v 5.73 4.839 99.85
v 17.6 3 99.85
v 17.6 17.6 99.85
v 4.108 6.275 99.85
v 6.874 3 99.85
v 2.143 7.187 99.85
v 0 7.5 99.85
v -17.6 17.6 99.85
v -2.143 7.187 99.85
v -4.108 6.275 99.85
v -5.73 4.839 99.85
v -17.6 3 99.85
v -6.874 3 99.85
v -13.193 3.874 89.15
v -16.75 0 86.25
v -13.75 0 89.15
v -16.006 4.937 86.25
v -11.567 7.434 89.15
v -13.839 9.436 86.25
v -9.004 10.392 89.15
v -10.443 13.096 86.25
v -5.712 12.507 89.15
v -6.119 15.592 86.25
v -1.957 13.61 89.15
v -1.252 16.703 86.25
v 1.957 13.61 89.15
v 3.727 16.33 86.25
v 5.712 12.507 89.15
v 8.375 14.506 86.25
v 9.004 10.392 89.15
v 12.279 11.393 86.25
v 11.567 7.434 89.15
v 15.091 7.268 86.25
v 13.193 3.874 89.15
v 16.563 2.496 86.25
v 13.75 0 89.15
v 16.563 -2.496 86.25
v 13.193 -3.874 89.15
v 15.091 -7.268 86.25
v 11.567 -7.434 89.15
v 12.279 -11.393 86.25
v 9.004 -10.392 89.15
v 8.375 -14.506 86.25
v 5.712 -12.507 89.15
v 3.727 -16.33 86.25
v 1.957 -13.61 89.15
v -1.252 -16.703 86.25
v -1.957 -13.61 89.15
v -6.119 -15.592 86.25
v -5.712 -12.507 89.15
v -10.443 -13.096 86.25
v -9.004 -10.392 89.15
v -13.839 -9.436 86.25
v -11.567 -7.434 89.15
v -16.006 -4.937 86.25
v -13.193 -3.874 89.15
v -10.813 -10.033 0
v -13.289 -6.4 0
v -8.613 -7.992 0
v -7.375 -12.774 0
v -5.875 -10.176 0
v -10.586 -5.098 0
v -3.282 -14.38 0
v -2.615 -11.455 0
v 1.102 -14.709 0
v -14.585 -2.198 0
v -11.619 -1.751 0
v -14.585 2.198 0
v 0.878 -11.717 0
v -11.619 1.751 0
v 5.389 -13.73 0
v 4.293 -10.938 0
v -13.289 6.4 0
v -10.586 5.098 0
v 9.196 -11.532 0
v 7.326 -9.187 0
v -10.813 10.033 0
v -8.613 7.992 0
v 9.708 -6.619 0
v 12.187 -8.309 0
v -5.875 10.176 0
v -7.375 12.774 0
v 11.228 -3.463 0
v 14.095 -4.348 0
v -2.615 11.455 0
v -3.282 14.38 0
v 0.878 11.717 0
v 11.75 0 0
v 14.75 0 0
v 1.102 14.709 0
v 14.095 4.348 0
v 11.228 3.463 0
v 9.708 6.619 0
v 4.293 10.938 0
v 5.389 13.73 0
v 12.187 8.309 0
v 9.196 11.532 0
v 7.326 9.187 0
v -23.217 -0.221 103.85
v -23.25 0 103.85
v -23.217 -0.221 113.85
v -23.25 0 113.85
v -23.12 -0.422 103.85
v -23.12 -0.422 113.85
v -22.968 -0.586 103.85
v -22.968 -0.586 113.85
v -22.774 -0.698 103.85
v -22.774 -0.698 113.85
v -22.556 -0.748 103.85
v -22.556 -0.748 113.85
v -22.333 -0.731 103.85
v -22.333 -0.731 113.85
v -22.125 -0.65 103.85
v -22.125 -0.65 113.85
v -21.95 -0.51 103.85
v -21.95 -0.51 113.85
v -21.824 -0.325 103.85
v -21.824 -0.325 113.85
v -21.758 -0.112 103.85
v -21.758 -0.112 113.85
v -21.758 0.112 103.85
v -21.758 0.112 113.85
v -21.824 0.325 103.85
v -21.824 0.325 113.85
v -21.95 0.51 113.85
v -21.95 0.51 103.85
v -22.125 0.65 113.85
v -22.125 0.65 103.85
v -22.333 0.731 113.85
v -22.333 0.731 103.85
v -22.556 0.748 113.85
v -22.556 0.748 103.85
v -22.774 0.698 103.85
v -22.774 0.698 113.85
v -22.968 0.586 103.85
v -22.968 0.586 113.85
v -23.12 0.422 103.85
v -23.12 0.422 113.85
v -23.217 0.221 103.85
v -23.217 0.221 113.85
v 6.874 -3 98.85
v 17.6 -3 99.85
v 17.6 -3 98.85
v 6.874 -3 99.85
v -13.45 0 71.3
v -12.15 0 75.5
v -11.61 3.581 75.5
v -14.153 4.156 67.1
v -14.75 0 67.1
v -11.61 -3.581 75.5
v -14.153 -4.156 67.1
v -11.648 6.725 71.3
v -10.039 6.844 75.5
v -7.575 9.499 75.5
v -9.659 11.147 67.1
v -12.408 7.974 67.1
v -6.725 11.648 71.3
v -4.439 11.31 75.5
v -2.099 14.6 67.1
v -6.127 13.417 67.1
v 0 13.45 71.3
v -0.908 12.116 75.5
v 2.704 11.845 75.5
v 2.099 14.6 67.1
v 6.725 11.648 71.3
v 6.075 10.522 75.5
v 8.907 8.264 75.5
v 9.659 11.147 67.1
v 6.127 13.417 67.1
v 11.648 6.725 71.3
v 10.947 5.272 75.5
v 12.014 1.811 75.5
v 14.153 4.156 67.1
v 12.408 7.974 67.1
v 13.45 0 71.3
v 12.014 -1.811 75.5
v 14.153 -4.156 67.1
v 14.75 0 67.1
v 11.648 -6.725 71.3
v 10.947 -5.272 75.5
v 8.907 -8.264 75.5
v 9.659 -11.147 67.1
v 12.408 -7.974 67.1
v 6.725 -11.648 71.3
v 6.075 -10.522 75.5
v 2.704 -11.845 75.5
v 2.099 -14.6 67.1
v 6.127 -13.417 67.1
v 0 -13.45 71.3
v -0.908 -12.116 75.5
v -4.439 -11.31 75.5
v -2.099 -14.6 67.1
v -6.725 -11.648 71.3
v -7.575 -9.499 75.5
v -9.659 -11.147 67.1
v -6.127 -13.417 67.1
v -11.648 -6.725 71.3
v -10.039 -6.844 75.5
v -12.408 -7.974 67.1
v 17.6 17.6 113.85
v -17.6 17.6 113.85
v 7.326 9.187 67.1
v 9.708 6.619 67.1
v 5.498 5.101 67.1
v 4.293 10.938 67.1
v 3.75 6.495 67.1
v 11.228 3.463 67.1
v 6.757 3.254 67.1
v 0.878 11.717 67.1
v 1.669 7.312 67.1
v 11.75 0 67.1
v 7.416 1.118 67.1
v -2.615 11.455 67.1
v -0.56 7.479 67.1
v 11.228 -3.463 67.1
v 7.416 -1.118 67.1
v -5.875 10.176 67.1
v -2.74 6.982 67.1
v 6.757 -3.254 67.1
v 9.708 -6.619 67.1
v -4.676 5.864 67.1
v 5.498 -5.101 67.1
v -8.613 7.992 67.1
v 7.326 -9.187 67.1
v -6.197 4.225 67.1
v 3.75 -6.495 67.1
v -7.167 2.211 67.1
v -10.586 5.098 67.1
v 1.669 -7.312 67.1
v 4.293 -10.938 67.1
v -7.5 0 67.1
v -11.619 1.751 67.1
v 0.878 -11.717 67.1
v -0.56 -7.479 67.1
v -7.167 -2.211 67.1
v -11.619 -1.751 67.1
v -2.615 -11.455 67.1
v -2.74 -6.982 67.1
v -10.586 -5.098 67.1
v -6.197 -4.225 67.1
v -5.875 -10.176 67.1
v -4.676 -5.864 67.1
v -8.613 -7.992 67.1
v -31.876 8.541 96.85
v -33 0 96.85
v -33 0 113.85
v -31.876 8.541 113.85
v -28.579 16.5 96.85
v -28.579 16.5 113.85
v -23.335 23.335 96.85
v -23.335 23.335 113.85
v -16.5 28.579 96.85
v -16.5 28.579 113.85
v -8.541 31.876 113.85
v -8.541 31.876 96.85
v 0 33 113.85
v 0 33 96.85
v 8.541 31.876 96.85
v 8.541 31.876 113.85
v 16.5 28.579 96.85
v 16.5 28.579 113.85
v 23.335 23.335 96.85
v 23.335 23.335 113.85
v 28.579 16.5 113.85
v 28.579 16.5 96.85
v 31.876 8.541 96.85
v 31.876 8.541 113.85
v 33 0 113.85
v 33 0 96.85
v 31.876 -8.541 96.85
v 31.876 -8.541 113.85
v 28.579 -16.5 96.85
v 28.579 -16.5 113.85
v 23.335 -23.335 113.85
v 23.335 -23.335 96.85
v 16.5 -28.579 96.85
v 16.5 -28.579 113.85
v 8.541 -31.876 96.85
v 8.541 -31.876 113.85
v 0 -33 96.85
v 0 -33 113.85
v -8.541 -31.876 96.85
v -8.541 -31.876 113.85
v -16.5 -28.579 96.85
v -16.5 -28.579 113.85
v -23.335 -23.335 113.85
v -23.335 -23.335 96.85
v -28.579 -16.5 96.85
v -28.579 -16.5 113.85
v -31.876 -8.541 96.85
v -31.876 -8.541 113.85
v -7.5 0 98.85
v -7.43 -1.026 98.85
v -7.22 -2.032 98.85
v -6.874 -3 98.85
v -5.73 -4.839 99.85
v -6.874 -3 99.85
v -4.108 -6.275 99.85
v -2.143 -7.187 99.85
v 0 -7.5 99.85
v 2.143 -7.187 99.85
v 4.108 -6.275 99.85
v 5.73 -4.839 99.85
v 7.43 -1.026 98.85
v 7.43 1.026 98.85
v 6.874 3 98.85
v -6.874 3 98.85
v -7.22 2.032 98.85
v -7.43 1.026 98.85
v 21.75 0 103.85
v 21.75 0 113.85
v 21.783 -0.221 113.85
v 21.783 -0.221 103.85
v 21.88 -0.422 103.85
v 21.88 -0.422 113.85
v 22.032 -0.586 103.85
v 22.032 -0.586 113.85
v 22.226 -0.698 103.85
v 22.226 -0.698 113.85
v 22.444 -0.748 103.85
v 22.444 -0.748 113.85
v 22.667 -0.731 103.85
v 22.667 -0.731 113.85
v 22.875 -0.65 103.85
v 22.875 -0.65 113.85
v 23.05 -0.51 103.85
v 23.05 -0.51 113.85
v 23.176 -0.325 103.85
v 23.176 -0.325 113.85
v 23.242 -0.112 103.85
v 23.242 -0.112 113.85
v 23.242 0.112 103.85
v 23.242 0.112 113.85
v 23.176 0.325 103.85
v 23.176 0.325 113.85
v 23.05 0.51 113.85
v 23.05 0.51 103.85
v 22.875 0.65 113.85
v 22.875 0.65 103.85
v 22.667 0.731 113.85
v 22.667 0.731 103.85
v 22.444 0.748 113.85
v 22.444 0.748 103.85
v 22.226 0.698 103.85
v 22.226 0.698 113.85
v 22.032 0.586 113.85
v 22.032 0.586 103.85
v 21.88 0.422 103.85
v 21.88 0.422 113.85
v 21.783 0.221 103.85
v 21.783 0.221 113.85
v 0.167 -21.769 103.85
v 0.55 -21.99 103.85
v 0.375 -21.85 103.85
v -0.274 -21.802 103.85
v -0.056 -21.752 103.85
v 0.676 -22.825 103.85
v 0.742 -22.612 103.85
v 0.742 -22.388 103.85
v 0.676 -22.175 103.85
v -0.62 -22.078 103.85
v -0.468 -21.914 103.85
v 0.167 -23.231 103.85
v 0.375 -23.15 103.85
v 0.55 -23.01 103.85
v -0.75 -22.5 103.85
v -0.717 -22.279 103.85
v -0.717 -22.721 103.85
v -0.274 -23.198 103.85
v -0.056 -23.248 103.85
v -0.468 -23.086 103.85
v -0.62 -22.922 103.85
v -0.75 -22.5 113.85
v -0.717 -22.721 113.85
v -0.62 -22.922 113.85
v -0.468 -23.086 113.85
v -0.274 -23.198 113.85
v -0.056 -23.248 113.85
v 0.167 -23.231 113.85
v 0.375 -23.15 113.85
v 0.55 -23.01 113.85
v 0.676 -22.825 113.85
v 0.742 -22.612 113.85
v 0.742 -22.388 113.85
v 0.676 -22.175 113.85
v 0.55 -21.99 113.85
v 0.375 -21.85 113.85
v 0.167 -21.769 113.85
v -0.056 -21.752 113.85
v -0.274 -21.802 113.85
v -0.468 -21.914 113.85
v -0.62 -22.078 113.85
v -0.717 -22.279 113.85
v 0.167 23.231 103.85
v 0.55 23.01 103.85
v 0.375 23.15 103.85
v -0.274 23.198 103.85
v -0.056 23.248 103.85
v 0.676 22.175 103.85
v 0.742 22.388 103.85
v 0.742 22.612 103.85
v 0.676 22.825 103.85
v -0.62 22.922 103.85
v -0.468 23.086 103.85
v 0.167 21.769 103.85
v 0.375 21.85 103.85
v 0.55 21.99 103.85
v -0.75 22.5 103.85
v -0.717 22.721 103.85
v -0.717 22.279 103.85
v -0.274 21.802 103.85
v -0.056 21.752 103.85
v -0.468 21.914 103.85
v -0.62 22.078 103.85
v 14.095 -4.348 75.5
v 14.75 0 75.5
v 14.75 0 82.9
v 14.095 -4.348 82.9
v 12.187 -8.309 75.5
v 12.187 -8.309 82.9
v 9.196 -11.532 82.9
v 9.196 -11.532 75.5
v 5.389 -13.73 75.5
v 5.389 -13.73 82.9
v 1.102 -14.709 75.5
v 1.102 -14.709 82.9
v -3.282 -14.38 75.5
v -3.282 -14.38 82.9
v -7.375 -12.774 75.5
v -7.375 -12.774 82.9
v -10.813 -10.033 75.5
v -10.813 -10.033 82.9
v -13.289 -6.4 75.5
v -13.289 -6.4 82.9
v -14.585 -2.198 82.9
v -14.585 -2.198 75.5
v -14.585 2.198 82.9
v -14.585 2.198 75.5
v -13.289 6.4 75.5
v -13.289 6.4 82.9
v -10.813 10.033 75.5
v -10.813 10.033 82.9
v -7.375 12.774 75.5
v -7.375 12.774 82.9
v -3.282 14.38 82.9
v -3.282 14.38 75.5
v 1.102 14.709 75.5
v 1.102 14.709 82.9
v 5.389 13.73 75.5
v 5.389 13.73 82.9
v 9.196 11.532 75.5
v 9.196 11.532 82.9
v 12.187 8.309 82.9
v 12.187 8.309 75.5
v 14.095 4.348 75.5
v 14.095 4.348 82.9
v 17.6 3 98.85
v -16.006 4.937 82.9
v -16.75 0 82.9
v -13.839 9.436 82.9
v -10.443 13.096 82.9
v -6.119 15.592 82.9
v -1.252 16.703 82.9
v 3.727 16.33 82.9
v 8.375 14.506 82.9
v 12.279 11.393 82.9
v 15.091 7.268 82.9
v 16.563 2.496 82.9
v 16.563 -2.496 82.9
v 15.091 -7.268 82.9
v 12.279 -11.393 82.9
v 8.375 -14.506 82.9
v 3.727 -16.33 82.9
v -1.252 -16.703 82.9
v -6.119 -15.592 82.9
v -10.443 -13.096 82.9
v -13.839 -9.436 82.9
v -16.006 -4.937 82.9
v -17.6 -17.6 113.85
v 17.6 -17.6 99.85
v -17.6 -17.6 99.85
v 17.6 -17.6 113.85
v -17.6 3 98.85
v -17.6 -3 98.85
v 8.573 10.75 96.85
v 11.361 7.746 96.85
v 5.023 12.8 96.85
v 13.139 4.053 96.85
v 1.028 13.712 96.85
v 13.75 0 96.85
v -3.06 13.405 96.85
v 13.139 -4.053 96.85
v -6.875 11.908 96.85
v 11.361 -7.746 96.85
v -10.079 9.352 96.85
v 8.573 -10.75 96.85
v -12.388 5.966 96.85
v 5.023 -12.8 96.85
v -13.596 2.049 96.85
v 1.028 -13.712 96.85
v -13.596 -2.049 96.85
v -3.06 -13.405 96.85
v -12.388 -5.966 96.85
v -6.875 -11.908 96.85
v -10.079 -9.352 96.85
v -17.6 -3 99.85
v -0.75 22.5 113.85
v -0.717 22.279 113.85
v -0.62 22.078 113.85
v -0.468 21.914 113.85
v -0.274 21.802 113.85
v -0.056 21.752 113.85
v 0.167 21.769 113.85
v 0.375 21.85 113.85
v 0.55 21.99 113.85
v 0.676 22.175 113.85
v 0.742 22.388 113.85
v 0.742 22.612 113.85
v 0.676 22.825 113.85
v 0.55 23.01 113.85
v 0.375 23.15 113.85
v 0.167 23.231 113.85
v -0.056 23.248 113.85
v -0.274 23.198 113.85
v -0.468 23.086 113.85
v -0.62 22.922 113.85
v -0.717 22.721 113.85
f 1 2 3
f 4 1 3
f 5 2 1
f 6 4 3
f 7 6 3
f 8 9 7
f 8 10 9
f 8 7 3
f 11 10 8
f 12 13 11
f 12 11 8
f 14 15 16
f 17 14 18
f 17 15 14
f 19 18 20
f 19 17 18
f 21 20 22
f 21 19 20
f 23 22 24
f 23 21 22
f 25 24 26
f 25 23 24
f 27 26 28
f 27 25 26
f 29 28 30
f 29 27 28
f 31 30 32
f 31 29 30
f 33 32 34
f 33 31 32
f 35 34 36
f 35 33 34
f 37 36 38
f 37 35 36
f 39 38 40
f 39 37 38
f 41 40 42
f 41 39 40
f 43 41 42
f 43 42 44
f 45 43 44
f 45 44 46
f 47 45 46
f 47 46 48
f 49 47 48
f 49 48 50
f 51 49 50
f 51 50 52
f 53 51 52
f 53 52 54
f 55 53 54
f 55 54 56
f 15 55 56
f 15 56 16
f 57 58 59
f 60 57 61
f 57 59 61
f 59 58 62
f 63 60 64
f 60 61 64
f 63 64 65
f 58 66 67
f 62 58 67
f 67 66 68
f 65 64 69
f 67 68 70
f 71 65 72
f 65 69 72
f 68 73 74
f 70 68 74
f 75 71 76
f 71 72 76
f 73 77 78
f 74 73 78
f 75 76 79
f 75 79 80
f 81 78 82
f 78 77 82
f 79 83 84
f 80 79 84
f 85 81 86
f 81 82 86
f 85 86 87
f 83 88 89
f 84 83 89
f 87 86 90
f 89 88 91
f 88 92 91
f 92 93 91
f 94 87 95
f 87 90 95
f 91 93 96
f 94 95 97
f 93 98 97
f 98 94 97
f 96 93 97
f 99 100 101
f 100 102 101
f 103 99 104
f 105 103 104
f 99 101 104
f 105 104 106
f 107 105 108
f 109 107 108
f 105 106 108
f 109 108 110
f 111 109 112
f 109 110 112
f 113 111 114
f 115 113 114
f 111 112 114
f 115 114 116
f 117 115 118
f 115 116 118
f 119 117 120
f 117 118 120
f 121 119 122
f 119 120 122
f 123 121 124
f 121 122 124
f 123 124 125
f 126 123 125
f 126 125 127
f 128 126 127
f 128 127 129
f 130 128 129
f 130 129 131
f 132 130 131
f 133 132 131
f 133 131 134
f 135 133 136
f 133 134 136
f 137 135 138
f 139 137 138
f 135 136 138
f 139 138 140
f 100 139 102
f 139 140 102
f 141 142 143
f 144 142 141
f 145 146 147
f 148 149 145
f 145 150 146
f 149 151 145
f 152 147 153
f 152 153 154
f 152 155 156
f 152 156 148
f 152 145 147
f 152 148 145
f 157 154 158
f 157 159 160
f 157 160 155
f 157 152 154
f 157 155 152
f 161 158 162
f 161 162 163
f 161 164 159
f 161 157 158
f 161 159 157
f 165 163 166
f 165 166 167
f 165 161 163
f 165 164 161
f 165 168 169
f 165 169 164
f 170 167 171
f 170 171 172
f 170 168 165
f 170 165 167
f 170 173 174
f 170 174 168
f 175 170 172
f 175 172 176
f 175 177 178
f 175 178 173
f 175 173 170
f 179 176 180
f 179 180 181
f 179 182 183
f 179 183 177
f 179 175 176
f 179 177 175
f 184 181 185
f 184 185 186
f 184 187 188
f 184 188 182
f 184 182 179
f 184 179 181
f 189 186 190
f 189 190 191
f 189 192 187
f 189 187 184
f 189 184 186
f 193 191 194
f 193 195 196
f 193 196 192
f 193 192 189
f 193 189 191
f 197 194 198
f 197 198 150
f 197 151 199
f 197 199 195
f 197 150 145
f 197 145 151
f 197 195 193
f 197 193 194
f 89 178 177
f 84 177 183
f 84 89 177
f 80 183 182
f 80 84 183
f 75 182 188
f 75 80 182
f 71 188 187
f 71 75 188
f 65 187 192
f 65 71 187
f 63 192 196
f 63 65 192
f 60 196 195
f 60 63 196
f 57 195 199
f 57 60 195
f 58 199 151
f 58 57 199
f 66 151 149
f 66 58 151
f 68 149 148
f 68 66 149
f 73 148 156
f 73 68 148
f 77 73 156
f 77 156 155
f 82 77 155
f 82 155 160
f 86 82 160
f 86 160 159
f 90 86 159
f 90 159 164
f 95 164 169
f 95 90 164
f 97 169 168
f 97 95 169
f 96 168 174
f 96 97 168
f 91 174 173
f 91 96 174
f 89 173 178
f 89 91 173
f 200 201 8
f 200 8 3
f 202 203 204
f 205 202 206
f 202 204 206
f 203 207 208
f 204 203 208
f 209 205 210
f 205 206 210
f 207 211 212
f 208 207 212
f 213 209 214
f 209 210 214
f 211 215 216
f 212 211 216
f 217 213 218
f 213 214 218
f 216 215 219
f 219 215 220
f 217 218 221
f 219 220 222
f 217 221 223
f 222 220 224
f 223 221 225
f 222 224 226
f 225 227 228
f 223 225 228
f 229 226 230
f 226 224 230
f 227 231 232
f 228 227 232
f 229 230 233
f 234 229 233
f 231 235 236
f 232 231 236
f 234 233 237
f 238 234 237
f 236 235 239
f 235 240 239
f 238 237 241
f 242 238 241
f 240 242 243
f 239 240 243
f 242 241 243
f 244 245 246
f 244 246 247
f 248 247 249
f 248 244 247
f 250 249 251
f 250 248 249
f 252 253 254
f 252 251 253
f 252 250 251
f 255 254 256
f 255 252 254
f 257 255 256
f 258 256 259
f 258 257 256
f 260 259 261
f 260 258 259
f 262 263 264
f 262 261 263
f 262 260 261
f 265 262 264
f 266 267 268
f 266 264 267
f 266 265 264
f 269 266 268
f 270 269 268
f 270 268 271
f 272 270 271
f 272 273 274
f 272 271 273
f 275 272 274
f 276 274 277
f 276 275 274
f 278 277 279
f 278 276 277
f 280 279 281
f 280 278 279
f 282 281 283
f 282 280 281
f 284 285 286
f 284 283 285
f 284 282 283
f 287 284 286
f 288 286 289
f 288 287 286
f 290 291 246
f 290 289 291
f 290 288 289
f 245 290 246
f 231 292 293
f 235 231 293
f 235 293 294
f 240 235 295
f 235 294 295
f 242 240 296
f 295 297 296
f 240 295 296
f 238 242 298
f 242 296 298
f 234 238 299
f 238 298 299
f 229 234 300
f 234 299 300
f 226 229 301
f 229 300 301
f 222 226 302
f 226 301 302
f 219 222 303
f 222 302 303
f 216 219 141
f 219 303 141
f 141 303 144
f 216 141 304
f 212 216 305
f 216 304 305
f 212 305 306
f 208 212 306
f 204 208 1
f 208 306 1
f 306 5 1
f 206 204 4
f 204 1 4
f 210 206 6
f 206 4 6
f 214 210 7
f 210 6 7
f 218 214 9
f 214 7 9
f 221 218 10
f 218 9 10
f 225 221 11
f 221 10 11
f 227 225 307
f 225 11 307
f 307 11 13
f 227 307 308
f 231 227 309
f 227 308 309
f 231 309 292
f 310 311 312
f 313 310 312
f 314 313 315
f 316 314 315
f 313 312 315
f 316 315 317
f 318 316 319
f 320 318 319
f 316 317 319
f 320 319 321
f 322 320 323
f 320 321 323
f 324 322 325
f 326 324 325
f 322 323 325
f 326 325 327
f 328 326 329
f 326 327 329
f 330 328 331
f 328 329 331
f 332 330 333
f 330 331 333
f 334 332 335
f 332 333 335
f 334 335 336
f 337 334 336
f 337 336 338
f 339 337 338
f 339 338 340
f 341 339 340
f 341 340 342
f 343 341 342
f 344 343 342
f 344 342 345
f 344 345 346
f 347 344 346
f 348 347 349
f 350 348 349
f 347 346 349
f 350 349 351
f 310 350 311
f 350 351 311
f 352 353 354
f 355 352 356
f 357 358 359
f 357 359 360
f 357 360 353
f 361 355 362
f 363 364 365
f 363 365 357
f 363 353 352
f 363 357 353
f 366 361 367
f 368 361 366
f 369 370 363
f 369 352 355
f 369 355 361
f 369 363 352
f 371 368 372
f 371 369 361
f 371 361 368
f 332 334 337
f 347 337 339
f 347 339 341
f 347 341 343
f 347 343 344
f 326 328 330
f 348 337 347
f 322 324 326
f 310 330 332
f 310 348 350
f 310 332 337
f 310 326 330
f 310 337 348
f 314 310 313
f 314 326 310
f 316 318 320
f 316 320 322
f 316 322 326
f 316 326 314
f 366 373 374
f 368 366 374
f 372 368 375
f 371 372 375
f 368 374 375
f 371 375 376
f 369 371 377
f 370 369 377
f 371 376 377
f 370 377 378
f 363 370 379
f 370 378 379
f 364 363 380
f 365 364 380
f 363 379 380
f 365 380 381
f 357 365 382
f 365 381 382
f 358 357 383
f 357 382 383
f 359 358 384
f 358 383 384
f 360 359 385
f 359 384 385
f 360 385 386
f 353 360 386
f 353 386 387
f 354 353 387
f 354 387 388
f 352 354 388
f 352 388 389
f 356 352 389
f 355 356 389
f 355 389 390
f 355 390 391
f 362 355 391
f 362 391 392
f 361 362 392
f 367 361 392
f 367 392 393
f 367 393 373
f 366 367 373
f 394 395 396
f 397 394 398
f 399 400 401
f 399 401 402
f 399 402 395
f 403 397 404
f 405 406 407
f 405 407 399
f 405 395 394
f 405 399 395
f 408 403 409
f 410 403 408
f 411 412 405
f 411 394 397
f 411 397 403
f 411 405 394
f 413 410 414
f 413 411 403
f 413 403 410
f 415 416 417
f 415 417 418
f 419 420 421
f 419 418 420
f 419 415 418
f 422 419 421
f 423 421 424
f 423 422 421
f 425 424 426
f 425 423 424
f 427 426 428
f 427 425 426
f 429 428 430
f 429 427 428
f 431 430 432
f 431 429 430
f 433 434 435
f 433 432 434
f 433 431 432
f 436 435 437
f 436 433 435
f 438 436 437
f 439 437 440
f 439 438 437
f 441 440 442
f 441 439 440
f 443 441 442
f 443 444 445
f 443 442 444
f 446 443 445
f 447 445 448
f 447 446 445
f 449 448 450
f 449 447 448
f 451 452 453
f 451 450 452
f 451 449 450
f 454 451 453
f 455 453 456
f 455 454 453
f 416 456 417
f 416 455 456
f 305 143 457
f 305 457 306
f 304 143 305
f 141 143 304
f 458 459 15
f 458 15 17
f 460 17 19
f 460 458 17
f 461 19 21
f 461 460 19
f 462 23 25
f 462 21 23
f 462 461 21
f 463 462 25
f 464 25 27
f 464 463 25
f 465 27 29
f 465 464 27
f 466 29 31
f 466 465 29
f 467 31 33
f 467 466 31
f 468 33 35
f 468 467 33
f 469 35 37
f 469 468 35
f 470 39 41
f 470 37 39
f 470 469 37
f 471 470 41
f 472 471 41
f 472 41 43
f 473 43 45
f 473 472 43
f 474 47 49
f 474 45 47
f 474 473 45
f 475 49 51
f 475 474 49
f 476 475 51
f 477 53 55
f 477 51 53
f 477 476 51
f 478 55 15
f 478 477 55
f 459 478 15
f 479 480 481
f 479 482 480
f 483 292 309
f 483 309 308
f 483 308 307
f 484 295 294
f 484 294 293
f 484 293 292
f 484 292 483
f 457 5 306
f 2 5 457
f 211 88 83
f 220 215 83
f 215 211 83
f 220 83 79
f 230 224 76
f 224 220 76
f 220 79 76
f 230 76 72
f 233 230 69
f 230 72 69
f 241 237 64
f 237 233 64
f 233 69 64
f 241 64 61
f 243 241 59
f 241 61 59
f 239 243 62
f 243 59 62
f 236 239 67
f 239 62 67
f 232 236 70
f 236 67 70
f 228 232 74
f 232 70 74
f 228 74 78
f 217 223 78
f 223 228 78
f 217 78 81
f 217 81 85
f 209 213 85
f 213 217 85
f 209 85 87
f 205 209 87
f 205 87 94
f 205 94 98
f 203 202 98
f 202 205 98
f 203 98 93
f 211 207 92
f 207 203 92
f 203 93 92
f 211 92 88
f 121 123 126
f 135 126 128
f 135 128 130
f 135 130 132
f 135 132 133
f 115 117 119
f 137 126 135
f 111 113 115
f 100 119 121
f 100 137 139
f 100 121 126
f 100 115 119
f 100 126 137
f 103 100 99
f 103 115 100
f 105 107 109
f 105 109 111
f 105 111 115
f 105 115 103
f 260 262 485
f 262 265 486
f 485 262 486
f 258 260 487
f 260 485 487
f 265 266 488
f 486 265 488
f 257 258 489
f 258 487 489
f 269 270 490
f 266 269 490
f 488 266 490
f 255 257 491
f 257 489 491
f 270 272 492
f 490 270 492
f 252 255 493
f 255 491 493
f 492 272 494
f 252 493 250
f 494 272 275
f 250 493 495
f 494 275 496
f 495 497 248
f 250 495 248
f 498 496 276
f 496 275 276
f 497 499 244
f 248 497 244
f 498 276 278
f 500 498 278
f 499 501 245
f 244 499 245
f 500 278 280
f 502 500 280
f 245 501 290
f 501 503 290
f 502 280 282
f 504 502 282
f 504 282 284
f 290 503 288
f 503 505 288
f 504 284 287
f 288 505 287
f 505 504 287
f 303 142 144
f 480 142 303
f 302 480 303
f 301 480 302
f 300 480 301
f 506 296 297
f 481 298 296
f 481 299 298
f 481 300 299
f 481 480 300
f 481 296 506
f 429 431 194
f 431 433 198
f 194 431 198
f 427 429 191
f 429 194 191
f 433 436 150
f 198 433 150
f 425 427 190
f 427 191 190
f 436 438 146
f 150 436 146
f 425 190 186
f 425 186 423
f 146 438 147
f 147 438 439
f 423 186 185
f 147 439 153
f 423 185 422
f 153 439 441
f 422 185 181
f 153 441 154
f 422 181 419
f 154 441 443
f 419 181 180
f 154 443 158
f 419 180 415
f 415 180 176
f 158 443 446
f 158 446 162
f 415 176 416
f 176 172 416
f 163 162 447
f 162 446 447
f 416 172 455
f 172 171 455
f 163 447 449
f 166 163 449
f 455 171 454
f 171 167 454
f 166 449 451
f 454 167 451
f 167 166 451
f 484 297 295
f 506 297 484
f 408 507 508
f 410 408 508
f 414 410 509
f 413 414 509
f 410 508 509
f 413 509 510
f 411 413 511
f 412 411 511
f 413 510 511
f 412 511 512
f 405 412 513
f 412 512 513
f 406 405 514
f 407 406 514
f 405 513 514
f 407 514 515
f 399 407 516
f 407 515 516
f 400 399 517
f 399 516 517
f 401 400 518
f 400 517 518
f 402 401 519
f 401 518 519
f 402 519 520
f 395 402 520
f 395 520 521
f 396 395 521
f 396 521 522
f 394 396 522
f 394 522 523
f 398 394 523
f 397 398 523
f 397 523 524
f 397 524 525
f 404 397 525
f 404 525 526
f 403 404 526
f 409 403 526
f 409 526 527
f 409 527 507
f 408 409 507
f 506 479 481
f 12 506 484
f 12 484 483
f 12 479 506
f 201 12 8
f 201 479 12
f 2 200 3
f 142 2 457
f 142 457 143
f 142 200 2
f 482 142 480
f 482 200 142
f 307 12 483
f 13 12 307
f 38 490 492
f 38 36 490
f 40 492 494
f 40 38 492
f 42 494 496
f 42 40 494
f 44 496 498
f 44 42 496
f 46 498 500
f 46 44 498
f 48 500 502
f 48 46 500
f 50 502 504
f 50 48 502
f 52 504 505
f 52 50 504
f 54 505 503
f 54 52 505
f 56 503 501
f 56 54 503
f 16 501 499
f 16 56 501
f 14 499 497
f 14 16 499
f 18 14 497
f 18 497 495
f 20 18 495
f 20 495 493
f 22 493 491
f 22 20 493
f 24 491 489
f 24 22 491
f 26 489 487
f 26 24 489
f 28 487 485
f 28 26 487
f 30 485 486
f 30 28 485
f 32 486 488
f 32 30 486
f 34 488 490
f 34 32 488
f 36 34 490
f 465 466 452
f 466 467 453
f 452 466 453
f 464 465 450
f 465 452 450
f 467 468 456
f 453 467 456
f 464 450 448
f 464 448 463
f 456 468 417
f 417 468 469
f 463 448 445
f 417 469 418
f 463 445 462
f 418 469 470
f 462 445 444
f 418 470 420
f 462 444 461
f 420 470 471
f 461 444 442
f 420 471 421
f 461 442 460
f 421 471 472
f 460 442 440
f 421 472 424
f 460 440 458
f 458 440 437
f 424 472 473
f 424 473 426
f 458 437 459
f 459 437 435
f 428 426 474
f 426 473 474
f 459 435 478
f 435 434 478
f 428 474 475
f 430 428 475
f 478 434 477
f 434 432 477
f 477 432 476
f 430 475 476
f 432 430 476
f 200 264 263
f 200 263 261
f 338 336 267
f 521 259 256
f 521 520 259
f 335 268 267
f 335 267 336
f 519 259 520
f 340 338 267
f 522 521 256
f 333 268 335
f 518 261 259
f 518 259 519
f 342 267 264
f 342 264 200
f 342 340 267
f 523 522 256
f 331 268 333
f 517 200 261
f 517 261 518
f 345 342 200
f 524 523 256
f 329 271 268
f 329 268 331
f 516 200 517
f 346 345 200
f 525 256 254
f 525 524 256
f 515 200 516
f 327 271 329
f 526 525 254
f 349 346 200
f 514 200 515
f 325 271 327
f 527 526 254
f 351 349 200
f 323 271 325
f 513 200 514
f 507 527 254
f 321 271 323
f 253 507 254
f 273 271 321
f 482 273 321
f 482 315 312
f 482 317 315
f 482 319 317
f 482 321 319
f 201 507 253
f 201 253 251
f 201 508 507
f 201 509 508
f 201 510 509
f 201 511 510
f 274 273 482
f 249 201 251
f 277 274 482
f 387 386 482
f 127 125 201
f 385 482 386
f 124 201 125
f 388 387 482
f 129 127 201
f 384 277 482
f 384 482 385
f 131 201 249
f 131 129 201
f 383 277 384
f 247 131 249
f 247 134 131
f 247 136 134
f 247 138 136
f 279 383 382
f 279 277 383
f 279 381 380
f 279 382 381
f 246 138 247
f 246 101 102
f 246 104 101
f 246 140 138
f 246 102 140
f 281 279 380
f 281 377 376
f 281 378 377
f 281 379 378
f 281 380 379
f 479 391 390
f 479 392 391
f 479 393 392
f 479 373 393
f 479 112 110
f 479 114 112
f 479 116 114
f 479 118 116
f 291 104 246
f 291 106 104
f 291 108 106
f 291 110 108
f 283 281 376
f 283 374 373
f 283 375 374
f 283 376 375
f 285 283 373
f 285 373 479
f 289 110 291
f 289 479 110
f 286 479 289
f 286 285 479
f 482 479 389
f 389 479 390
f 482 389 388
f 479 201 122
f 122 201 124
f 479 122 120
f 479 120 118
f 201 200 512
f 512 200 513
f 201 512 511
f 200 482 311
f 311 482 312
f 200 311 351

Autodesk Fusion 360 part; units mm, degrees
sketch "Sketch1" plane through (0, 0, 0) normal (0, 0, 1) x (1, 0, 0) in component "Arm Cam"
  circle A0 centre (0, 0) radius 14.75
  circle A1 centre (0, 0) radius 11.75
  dimension "d322" = 29.5
  dimension "d323" = -3
  dimension "d395" = 23.5
extrude "Extrude1" add sketch "Sketch1" along normal blind 67.1 makes body 1 in component "Arm Cam"
sketch "Sketch5" plane through (0, 0, 67.1) normal (0, 0, 1) x (-1, 0, 0) in component "Arm Cam"
  circle A0 centre (0, 0) radius 11.75
  circle A1 centre (0, 0) radius 14.75
  circle A2 centre (0, 0) radius 14.75
ref_plane "WorkPlane2" through (0, 0, 75.5) normal (0, 0, 1) x (1, 0, 0) in component "Arm Cam"
sketch "Sketch4" plane through (-143.4796, -223.0695, 75.5) normal (0, 0, 1) x (1, 0, 0) in component "Arm Cam"
  circle A0 centre (143.4796, 223.0695) radius 14.75
  circle A1 centre (143.4796, 223.0695) radius 12.15
  point P0 (143.4796, 223.0695)
  dimension "d330" = 29.5
  dimension "d334" = 24.3
loft "Loft2" add profiles "Sketch5", "Sketch4" section 1 section 2 contours A1 bodies 1 in component "Arm Cam"
extrude "Extrude4" add sketch "Sketch4" along normal blind 7.4 contours A0 | A1 bodies 1 in component "Arm Cam"
sketch "Sketch7" plane through (0, 0, 82.9) normal (0, 0, 1) x (-1, 0, 0) in component "Arm Cam"
  circle A0 centre (0, 0) radius 14.75
  circle A1 centre (0, 0) radius 16.75
  dimension "d339" = 33.5
extrude "Extrude5" add sketch "Sketch7" along normal blind 3.35 contours A0 | A1 bodies 1 in component "Arm Cam"
ref_plane "WorkPlane3" through (0, 0, 89.15) normal (0, 0, 1) x (-1, 0, 0) in component "Arm Cam"
sketch "Sketch8" plane through (-143.4796, -223.0695, 89.15) normal (0, 0, 1) x (1, 0, 0) in component "Arm Cam"
  circle A0 centre (143.4796, 223.0695) radius 13.75
  point P0 (143.4796, 223.0695)
  dimension "d341" = 27.5
extrude "Extrude6" add sketch "Sketch8" along normal blind 7.7 separate body makes body 2 in component "Arm Cam"
loft "Loft3" add section 1 face at (-0.9963, -4.3652, 86.25) section 2 face at (-1.0199, 5.8346, 89.15) on bodies 1 2 bodies 1 2 in component "Arm Cam"
sketch "Sketch9" plane through (0, 0, 96.85) normal (0, 0, 1) x (-1, 0, 0) in component "Arm Cam"
  circle A0 centre (0, 0) radius 13.75
  circle A1 centre (0, 0) radius 33
  dimension "d344" = 66
  dimension "d351" = 27.5
extrude "Extrude7" add sketch "Sketch9" along normal blind 17 contours A0 | A1 bodies 1 in component "Arm Cam"
sketch "Sketch10" plane through (0, 0, 113.85) normal (0, 0, 1) x (-1, 0, 0) in component "Arm Cam"
  circle A0 centre (0, 0) radius 33
  line L0 (-17.6, 17.6) -> (17.6, 17.6)
  line L1 (17.6, 17.6) -> (17.6, -17.6)
  line L2 (17.6, -17.6) -> (-17.6, -17.6)
  line L3 (-17.6, -17.6) -> (-17.6, 17.6)
  line L4 (-17.6, 17.6) -> (17.6, -17.6) construction
  line L5 (17.6, 17.6) -> (-17.6, -17.6) construction
  circle A1 centre (0, 0) radius 7.5
  line L6 (-17.6, 3) -> (17.6, 3)
  line L7 (17.6, 3) -> (17.6, -3)
  line L8 (17.6, -3) -> (-17.6, -3)
  line L9 (-17.6, -3) -> (-17.6, 3)
  line L10 (-17.6, 3) -> (17.6, -3) construction
  line L11 (17.6, 3) -> (-17.6, -3) construction
  line L12 (-22.5, 22.5) -> (22.5, 22.5) construction
  line L13 (22.5, 22.5) -> (22.5, -22.5) construction
  line L14 (22.5, -22.5) -> (-22.5, -22.5) construction
  line L15 (-22.5, -22.5) -> (-22.5, 22.5) construction
  line L16 (-22.5, 22.5) -> (22.5, -22.5) construction
  line L17 (22.5, 22.5) -> (-22.5, -22.5) construction
  circle A2 centre (22.5, 0) radius 0.75
  circle A3 centre (0, -22.5) radius 0.75
  circle A4 centre (-22.5, 0) radius 0.75
  circle A5 centre (0, 22.5) radius 0.75
  dimension "d347" = 35.2
  dimension "d348" = 35.2
  dimension "d352" = 15
  dimension "d354" = 6
  dimension "d357" = 45
  dimension "d358" = 45
  dimension "d359" = 1.5
  dimension "d360" = 1.5
  dimension "d361" = 1.5
  dimension "d362" = 1.5
extrude "Extrude8" cut sketch "Sketch10" against normal blind 14 contours L0 L1 L3 A1 L6 | L3 A1 L6 L8 L9 | L1 A1 L6 L7 L8 | L1 L2 L3 A1 L8 | A1 L6 L8 | A1 L6 | A1 L8 bodies 1 in component "Arm Cam"
extrude "Extrude9" cut sketch "Sketch10" against normal through all contours A1 L6 L8 | A1 L6 | A1 L8 bodies 1 1 in component "Arm Cam"
extrude "Extrude10" cut sketch "Sketch10" against normal blind 15 contours L3 A1 L6 L8 L9 | L1 A1 L6 L7 L8 bodies 1 in component "Arm Cam"
extrude "Extrude11" cut sketch "Sketch10" against normal blind 10 contours A2 | A3 | A4 | A5 bodies 1 in component "Arm Cam"
component "Arm Cam" placed x (1, 0, 0) y (0, 1, 0) z (0, 0, 1) at (0, 0, 0)
equation "Trous_Vis_diam2 = 2.2 mm"
